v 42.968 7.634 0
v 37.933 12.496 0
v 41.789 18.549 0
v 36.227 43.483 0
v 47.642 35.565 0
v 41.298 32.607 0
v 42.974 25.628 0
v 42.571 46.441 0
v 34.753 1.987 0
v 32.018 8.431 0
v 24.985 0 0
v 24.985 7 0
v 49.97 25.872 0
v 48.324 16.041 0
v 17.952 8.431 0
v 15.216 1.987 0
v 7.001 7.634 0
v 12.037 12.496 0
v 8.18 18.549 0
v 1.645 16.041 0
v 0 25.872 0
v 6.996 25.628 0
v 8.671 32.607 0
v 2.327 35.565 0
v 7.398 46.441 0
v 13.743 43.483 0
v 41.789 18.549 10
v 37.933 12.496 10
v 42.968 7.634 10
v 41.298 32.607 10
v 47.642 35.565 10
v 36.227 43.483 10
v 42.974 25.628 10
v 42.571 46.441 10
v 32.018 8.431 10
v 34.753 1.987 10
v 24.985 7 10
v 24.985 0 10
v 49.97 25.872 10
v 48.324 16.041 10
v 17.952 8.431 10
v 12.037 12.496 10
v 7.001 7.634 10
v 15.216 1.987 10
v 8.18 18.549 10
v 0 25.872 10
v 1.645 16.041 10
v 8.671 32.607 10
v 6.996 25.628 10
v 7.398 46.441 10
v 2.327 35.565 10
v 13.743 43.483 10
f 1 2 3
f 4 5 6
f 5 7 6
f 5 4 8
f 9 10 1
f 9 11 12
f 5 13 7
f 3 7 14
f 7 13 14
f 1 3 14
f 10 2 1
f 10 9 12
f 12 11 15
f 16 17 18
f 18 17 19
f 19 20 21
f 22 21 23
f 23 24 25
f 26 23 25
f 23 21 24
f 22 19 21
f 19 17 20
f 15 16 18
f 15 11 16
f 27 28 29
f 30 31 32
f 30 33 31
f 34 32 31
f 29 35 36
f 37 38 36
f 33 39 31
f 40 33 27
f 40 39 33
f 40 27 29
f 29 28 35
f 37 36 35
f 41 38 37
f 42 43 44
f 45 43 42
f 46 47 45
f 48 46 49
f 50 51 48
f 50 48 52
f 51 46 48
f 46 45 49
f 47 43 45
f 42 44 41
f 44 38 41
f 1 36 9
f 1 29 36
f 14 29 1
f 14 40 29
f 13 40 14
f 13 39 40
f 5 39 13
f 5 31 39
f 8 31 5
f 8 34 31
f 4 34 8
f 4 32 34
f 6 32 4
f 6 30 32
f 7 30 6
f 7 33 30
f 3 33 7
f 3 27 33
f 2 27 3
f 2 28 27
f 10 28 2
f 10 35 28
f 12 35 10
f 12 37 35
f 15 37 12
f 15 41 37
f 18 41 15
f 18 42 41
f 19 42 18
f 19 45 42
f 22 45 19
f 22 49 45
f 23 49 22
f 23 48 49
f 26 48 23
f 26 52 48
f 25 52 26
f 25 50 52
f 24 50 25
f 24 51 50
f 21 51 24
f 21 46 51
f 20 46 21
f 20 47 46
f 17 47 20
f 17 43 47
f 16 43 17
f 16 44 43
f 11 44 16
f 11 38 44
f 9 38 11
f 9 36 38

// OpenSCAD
$fn = 32;

// ----------------------------------------------------------------------
// Clip blank: omega clip, 10 mm thick
// ----------------------------------------------------------------------

// --- parameters (mm) ---
profile_height = 10;      // extrusion height
profile_points = 26;      // points of the closed outline

profile = [[2.327, 35.565], [0, 25.872], [1.645, 16.041], [7.001, 7.634], [15.216, 1.987], [24.985, 0], [34.753, 1.987], [42.968, 7.634], [48.324, 16.041], [49.97, 25.872], [47.642, 35.565], [42.571, 46.441], [36.227, 43.483], [41.298, 32.607], [42.974, 25.628], [41.789, 18.549], [37.933, 12.496], [32.018, 8.431], [24.985, 7], [17.952, 8.431], [12.037, 12.496], [8.18, 18.549], [6.996, 25.628], [8.671, 32.607], [13.743, 43.483], [7.398, 46.441]];  // single closed polygon, 26 points, counter clockwise

// --- the one profile operation ---
linear_extrude(height = profile_height) polygon(points = profile);
